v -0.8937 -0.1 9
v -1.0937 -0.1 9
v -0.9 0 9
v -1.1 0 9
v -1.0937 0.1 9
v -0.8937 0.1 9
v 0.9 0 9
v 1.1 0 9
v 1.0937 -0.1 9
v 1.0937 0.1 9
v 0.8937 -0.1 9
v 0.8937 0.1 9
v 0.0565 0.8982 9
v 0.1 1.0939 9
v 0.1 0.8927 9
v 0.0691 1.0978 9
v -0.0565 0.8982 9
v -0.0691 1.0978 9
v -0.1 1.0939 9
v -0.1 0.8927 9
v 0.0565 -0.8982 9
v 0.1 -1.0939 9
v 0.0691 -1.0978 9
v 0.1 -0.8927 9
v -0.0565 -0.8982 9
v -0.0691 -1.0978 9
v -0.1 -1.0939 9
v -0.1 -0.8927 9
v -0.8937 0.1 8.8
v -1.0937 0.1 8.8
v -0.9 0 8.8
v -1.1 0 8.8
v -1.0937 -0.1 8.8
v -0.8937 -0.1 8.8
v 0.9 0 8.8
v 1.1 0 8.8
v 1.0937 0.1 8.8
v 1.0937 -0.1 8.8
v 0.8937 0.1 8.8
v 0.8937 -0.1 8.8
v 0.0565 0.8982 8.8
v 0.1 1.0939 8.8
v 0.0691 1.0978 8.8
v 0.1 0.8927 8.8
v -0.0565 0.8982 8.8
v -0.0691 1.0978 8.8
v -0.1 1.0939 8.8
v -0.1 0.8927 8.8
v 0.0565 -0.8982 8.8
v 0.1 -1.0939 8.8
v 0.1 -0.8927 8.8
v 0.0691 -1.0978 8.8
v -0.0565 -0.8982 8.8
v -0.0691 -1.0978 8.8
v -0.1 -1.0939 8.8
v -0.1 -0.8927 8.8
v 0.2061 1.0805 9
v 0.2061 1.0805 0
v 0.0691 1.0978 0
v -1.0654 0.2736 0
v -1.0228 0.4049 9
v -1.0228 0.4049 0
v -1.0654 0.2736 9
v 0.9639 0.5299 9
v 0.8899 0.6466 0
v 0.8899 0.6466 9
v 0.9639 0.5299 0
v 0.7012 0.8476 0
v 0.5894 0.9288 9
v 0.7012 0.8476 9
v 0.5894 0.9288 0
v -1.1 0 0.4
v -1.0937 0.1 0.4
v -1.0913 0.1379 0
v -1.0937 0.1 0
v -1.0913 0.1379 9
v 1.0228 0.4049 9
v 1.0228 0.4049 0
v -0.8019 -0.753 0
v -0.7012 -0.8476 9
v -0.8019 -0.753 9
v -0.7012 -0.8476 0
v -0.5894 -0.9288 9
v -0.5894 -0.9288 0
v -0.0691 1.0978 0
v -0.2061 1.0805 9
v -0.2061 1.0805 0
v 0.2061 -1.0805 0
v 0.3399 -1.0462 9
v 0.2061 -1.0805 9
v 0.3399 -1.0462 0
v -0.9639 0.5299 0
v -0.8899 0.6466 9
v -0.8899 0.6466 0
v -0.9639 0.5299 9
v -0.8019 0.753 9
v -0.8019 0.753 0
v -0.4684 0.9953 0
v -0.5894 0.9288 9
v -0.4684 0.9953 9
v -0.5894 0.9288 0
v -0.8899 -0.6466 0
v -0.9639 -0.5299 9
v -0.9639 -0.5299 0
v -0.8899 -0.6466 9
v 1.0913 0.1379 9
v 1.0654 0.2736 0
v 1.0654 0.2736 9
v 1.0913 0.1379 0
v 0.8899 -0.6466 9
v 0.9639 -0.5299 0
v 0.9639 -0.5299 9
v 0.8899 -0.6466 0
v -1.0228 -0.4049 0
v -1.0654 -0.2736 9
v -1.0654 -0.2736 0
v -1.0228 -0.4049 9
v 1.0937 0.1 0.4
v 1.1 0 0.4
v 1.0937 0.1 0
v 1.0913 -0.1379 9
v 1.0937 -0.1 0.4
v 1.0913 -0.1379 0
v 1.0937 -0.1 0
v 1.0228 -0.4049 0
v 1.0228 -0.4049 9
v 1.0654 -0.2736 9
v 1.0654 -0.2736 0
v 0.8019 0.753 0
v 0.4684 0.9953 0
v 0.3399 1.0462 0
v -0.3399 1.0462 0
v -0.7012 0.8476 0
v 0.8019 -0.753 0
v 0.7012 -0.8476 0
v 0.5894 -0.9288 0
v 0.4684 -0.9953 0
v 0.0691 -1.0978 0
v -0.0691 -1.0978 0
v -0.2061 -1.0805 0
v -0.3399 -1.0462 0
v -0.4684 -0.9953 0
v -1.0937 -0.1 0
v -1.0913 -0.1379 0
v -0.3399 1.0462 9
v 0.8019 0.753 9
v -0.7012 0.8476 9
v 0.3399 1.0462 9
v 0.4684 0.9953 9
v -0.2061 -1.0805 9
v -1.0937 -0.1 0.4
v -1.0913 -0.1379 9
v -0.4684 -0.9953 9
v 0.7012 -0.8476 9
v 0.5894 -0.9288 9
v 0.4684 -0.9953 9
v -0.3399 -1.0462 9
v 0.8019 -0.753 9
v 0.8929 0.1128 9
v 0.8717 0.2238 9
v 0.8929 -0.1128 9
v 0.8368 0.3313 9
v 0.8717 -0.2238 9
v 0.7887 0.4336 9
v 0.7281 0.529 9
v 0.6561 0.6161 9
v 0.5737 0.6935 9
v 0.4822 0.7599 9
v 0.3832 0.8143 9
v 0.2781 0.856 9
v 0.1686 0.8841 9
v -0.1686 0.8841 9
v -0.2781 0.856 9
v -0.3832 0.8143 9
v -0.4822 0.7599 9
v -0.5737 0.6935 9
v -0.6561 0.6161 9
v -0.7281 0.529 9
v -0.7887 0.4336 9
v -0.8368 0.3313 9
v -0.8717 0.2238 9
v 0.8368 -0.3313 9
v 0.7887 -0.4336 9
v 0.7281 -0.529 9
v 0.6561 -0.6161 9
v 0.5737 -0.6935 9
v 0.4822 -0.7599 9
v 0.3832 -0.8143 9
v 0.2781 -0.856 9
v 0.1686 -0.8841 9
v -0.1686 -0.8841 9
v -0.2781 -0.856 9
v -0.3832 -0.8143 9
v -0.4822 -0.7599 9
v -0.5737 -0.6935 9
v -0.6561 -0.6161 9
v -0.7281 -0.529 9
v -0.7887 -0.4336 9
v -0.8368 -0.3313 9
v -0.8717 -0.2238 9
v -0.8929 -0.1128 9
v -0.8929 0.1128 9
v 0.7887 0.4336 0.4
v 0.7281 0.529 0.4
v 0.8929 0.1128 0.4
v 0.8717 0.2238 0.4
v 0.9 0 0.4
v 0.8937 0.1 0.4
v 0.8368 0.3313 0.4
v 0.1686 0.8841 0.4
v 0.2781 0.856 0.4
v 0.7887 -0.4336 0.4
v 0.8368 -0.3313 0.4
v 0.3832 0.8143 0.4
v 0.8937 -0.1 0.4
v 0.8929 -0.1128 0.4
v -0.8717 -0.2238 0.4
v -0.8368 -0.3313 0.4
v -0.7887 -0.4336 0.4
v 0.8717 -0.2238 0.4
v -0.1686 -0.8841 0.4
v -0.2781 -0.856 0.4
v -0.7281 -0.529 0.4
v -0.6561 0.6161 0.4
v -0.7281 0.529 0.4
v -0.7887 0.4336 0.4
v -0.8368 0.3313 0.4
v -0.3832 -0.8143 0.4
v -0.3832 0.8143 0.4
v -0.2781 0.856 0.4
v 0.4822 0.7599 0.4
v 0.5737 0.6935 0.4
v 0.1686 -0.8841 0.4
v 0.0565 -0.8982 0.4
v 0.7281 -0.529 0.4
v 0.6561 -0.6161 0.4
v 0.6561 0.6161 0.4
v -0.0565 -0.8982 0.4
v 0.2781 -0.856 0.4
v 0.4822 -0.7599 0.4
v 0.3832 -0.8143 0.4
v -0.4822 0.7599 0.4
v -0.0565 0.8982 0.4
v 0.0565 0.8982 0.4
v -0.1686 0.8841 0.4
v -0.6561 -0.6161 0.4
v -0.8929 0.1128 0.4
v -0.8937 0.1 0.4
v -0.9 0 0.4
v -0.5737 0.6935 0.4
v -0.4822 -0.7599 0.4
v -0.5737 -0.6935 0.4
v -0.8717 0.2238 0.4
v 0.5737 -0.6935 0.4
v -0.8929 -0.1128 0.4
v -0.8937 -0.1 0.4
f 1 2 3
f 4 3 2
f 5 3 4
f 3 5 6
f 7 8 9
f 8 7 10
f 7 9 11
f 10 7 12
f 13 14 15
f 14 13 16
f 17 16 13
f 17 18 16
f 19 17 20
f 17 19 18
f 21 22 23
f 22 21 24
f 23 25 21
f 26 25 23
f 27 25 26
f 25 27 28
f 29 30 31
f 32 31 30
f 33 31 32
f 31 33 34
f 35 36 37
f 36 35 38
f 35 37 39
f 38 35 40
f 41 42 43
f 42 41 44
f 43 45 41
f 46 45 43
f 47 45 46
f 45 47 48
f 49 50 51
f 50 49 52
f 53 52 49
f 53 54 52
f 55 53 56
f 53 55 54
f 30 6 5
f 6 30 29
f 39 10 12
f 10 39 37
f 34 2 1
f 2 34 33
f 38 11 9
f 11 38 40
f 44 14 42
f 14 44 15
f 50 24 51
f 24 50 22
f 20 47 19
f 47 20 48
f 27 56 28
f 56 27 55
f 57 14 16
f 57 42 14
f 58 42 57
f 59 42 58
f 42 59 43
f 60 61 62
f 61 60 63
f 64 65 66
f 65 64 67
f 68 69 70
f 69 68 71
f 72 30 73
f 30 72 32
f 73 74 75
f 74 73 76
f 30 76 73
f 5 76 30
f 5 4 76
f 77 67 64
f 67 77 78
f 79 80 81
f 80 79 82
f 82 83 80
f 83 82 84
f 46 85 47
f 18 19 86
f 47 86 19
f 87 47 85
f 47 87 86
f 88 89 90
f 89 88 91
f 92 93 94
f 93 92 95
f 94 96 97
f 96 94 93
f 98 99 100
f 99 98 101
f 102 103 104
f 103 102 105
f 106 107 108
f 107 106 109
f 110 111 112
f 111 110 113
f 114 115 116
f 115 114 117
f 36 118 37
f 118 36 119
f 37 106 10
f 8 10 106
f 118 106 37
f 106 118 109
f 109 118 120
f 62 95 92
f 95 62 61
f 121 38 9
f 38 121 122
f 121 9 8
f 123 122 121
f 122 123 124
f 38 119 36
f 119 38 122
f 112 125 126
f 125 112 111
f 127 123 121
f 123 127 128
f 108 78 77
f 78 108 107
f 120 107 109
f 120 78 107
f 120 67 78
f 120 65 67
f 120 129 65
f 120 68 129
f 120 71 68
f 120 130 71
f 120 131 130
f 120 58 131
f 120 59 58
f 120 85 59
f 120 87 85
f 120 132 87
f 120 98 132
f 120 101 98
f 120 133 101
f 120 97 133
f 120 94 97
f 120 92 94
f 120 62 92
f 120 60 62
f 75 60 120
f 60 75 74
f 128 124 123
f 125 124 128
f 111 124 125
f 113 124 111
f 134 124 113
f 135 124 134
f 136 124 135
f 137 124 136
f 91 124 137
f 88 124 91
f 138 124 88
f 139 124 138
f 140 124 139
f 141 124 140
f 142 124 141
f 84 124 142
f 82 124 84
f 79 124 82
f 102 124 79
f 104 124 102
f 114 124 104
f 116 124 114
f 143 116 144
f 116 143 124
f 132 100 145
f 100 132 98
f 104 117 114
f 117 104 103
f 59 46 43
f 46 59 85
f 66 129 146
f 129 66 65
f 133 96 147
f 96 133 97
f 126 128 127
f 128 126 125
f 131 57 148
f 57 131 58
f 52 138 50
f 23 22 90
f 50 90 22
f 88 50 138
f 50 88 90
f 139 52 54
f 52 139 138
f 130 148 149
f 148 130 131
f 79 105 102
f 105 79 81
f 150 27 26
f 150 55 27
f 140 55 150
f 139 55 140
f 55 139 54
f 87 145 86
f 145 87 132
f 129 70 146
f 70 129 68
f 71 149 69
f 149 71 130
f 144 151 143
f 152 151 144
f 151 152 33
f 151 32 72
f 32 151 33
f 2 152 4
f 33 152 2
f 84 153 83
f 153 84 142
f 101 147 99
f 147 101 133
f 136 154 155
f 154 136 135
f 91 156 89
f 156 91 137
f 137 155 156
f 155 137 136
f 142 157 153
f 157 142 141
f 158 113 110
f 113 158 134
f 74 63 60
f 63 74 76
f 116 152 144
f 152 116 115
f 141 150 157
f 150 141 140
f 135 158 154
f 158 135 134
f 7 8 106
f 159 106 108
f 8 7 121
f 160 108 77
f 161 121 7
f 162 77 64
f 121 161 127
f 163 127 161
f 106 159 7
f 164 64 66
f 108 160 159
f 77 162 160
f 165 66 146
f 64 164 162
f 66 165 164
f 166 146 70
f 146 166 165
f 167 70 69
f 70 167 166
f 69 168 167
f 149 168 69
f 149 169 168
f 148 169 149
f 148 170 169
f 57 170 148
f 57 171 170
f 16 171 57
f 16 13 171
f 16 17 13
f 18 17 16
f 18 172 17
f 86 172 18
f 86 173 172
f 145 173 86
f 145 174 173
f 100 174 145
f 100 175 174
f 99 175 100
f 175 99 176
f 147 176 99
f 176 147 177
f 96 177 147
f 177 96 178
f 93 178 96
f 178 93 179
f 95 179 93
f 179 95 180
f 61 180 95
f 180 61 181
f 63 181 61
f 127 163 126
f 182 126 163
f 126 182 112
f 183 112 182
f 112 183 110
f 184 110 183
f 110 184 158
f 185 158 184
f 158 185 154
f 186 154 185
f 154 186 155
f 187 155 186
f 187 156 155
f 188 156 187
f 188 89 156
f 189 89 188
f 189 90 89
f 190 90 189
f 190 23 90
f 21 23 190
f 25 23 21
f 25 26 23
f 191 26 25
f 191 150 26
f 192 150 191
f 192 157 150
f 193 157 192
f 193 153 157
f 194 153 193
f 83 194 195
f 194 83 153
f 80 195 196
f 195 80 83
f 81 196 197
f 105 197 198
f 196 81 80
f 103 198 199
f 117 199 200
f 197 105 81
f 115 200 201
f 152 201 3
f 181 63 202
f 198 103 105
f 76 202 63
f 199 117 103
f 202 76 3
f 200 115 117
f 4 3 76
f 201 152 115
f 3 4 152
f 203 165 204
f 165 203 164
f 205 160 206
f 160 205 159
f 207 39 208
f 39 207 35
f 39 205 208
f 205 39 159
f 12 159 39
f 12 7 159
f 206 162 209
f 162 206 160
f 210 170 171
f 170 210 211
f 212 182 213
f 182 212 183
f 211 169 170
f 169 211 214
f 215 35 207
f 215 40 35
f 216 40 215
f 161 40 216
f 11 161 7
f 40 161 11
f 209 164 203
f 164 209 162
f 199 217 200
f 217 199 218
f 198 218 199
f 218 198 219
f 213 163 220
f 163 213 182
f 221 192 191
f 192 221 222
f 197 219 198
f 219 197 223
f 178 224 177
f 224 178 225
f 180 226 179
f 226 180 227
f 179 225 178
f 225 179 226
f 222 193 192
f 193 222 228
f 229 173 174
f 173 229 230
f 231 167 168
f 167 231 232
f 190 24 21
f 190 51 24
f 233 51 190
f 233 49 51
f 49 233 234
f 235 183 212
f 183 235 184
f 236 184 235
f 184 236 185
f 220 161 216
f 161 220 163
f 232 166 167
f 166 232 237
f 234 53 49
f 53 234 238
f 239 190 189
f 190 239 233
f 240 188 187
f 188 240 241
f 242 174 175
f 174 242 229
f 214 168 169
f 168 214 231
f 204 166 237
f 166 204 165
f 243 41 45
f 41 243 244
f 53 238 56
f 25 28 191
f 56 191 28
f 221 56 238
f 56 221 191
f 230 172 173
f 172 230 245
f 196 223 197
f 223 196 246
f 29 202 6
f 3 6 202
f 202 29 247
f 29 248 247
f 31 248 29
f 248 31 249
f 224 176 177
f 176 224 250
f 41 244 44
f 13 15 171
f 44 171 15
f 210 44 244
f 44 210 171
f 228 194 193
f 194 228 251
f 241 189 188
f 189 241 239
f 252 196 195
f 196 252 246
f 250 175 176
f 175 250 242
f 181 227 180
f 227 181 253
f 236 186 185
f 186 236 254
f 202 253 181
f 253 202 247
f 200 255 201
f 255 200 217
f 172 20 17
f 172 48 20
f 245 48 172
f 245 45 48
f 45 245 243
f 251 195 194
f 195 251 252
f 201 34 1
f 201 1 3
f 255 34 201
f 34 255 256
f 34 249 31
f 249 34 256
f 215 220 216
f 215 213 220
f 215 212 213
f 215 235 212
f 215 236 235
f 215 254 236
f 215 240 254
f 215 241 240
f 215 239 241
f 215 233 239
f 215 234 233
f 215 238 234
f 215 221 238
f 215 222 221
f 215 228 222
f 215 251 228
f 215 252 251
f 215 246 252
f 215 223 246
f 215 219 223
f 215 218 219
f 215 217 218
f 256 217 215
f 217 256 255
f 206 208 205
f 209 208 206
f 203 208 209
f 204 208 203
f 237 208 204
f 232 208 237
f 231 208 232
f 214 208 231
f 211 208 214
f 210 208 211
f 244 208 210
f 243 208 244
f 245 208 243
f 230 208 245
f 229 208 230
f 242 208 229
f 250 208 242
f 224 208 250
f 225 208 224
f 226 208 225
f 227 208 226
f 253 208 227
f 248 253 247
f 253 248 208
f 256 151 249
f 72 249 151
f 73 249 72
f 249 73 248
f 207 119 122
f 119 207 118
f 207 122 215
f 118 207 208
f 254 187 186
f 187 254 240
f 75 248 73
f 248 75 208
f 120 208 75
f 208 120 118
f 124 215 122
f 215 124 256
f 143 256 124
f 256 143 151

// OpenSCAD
// length of the tube
length = 9;
// diameter of the tube end
diameter = 2.2;
// Width of the gap for the elastic and the tube end
gapWidth = 0.2;
// thickness of the print
thickness = 0.4;

$fn = 50;
module TubeHolder(length, radius, thickness, gapWidth){
    

            difference(){
                cylinder(length,radius, radius);
                
                translate([0,0,thickness]){
                    cylinder(length, radius - thickness/2, radius - thickness/2);
                }
                translate([0,0,length - gapWidth/2 ]){
                    cube([2*radius, gapWidth, gapWidth], true);
                    cube([gapWidth, 2*radius, gapWidth], true);
                }
                cube([2*radius,gapWidth,thickness * 2], true);
            }
}

TubeHolder(length, diameter/2, thickness, gapWidth);
